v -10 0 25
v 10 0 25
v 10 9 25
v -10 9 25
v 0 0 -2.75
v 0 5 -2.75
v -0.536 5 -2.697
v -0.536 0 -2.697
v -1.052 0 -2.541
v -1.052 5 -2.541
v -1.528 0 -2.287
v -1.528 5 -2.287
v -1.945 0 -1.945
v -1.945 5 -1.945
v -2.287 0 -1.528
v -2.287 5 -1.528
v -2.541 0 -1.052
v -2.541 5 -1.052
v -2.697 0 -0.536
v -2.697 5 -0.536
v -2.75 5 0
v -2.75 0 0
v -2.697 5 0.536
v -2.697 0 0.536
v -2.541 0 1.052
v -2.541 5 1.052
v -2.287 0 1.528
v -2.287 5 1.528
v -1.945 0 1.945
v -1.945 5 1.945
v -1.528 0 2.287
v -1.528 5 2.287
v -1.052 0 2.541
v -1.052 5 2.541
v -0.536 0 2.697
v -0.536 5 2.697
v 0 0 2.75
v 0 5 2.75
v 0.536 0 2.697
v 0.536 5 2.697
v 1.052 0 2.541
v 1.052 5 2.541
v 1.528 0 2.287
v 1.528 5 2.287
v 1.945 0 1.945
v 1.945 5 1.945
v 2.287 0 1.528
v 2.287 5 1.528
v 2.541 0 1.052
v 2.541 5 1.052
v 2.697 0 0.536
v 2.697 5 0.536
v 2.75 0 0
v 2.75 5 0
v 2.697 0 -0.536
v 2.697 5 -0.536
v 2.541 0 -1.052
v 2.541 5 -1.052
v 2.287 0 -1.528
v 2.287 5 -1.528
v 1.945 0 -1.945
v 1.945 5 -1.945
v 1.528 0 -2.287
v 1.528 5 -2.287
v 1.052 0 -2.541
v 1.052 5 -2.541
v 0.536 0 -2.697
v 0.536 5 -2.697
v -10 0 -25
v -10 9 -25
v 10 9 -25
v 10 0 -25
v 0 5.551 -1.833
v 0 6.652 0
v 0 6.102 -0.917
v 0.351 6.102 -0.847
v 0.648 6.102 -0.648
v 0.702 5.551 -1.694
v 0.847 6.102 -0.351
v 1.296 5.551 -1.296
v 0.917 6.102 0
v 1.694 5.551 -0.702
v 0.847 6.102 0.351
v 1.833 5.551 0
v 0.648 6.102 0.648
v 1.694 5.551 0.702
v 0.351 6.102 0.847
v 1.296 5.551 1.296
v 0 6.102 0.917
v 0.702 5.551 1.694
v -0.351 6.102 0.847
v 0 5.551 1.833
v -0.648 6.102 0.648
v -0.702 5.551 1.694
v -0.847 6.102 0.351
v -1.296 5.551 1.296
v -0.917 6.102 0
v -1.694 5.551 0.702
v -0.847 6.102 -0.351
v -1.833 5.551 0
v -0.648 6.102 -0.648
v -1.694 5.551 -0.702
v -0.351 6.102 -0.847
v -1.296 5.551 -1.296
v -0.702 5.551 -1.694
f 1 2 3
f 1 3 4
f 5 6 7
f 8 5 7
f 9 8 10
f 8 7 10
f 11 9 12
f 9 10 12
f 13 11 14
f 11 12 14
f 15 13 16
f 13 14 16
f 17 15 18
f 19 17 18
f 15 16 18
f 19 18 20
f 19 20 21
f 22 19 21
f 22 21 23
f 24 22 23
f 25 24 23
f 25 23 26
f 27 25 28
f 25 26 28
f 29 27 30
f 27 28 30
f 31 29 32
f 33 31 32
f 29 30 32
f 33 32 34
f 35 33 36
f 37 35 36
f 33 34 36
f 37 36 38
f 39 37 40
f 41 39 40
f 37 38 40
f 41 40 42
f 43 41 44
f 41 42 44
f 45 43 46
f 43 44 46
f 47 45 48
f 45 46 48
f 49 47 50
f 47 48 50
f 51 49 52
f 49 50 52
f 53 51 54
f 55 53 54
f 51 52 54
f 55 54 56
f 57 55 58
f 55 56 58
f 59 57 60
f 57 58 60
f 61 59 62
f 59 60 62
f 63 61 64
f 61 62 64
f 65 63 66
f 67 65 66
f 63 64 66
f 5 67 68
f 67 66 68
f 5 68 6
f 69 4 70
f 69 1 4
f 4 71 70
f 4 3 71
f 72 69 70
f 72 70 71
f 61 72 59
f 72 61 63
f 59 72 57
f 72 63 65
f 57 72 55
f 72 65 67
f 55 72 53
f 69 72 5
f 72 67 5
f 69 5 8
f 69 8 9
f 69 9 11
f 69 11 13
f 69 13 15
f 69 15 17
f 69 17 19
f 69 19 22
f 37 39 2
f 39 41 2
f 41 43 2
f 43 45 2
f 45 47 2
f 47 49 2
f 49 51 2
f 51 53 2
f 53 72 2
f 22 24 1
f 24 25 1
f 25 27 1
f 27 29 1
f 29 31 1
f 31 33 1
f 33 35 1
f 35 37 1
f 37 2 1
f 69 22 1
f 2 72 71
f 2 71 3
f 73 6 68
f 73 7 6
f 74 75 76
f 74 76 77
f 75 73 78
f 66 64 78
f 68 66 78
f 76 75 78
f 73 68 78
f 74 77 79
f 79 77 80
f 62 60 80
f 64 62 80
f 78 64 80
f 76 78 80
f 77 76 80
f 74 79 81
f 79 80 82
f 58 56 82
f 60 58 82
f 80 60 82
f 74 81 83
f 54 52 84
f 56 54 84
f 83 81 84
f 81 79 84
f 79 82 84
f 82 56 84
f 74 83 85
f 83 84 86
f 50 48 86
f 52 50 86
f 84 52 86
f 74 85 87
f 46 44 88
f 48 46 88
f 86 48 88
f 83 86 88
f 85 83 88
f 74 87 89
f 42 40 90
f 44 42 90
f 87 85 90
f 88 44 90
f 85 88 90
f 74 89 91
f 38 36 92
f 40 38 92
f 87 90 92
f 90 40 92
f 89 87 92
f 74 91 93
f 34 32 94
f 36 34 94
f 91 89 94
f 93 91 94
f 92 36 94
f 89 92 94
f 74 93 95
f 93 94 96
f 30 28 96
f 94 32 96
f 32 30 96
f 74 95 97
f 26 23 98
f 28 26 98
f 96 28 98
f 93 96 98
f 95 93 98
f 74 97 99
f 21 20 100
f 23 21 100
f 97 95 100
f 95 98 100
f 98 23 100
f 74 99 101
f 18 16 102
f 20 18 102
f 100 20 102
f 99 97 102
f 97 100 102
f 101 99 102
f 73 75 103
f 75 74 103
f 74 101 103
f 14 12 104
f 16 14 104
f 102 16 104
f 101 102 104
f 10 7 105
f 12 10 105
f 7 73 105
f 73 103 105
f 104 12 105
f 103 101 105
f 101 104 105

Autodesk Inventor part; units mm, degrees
ref_plane "YZ Plane" through (0, 0, 0) normal (1, 0, 0) x (0, 1, 0)
ref_plane "XZ Plane" through (0, 0, 0) normal (0, 1, 0) x (-1, 0, 0)
ref_plane "XY Plane" through (0, 0, 0) normal (0, 0, 1) x (1, 0, 0)
sketch "Sketch1" plane through (0, 0, 0) normal (0, 1, 0) x (-1, 0, 0)
  line L0 (-10, 25) -> (10, 25)
  line L1 (10, 25) -> (10, -25)
  line L2 (10, -25) -> (-10, -25)
  line L3 (-10, -25) -> (-10, 25)
  line L4 (-10, 25) -> (10, -25) construction
  line L5 (10, 25) -> (-10, -25) construction
  point P0 (0, 0)
  dimension "d2" = 50
  dimension "d3" = 20
extrude "Extrusion1" add sketch "Sketch1" along normal blind 9
sketch "Sketch2" plane through (0, 0, 0) normal (0, -1, 0) x (1, 0, 0)
  point P0 (0, 0)
hole "Hole1" at (0, 0, 0) direction (0, 1, 0) diameter 5.5 depth 5 tip angle 118 clearance for "Countersunk Flat Head Screw ISO 2009/7046" size "M5" standard "ISO"
properties part number "SP44V1 Tope Hierro"
